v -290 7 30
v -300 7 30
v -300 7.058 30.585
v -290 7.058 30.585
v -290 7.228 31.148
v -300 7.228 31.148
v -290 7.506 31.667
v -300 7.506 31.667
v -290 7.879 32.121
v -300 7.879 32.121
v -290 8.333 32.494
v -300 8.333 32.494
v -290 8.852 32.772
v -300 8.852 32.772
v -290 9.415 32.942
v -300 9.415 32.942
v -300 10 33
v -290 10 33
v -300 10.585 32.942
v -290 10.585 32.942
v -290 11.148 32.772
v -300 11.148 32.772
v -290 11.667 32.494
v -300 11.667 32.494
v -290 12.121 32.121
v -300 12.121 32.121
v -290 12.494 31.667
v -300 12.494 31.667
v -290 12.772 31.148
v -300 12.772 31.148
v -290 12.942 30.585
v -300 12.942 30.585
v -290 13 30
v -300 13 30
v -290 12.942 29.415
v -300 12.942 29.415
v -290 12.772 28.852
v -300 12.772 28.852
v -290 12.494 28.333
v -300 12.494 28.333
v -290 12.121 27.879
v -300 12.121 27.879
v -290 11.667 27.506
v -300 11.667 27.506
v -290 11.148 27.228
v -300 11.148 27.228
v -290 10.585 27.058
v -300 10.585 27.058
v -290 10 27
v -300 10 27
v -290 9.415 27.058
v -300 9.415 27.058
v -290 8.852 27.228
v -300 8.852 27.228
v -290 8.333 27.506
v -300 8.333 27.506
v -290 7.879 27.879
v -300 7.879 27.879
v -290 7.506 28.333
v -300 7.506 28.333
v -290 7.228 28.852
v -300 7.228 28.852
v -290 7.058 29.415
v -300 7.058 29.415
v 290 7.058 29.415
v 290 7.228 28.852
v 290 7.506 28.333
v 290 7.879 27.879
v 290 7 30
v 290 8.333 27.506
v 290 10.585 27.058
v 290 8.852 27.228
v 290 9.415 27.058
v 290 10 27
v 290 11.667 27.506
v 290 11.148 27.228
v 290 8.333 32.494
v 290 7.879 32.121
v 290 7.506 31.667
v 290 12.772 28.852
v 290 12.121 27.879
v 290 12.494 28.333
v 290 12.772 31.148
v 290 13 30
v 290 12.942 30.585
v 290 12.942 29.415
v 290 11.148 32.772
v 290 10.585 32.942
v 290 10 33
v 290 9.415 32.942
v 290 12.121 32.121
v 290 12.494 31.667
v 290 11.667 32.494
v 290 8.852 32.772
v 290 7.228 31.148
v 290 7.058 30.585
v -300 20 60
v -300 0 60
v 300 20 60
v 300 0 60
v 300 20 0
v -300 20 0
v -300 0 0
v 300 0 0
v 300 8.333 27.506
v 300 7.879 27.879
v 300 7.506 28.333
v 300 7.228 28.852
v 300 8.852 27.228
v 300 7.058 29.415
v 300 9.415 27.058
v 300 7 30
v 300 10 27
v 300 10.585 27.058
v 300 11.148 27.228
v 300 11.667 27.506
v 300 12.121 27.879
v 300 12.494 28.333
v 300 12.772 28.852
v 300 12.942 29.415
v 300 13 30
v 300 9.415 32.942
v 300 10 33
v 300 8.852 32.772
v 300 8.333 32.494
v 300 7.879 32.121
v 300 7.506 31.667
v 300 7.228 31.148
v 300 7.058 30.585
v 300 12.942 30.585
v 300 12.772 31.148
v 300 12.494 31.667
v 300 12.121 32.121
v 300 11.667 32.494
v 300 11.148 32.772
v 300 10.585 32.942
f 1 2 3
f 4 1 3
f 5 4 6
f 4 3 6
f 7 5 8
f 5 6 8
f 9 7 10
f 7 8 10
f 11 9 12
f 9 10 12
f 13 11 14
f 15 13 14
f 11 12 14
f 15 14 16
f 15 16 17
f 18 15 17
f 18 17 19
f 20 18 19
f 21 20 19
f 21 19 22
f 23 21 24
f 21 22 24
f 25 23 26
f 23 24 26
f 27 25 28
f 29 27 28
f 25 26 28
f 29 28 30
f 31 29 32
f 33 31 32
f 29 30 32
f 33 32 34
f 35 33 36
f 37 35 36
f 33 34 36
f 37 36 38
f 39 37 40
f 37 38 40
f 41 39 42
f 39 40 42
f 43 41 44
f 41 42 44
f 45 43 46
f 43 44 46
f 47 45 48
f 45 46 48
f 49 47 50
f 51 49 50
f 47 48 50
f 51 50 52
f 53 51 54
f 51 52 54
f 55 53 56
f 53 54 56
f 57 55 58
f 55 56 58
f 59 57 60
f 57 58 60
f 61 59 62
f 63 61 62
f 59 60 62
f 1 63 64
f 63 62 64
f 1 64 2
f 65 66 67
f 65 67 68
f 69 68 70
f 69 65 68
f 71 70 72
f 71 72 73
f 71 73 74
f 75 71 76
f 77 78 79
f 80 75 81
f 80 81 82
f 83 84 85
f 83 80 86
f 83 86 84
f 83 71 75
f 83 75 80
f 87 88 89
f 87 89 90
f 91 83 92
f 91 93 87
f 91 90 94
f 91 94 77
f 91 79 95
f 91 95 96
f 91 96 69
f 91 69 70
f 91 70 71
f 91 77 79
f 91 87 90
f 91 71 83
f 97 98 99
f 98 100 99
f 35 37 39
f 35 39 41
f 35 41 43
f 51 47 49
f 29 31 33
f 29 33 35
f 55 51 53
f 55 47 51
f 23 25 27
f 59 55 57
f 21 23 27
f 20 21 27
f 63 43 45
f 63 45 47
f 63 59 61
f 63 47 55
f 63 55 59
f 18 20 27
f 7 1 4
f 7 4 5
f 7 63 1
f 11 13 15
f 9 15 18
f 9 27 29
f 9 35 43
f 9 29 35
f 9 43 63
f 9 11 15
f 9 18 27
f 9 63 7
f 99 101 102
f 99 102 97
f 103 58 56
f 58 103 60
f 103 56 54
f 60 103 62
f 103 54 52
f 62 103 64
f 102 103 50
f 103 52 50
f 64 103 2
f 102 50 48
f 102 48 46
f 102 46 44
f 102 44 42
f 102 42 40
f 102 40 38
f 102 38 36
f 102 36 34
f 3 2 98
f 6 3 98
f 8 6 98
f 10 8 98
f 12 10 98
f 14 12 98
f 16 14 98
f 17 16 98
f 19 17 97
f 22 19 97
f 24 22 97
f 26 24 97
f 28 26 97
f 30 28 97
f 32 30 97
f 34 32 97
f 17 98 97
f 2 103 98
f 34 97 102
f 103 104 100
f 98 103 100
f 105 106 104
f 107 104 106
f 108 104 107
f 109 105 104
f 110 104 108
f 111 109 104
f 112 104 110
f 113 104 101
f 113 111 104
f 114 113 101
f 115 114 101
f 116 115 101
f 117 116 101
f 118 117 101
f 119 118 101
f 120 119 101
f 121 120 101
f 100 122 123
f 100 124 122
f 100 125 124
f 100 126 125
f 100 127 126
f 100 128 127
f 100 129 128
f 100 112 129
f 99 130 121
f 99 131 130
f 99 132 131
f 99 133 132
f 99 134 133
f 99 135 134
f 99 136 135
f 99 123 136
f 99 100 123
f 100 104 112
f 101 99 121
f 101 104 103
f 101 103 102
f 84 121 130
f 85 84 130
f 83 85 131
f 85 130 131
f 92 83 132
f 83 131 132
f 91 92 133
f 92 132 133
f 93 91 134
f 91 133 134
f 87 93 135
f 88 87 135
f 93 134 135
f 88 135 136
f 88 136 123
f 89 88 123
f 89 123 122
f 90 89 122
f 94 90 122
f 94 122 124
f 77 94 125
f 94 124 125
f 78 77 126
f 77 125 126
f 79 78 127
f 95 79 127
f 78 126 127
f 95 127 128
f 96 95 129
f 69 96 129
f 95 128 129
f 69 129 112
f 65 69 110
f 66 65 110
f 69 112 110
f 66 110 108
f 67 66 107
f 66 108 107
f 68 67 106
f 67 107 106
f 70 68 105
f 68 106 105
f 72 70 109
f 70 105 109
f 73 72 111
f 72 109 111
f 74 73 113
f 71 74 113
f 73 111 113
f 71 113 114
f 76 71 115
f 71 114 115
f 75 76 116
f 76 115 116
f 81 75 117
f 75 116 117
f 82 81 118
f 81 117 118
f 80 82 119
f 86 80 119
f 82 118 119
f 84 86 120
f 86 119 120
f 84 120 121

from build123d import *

# Parameters (mm, degrees)
F0_W          = 20
F0_H          = 60
F1_DEPTH      = 300
F1_DEPTH_BACK = 300
F2_R          = 3
F3_DEPTH      = 10
F4_R          = 3
F5_DEPTH      = 10


with BuildPart() as f1:
    # F0 (on Right) → F1 (new body, two sides)
    with BuildSketch(Plane.YZ) as f1_sk:
        with Locations((10, 30)):
            Rectangle(F0_W, F0_H)
    extrude(amount=F1_DEPTH)
    extrude(f1_sk.sketch, amount=-F1_DEPTH_BACK)

    # F2 (on face) → F3 (cut)
    with BuildSketch(Plane.YZ.offset(300)):
        with Locations((10, 30)):
            Circle(F2_R)
    extrude(amount=-F3_DEPTH, mode=Mode.SUBTRACT)

    # F4 (on face) → F5 (cut)
    with BuildSketch(Plane(origin=(-300, 0, 0), x_dir=(0, -1, 0), z_dir=(-1, 0, 0))):
        with Locations((-10, 30)):
            Circle(F4_R)
    extrude(amount=-F5_DEPTH, mode=Mode.SUBTRACT)


solid = f1.part
